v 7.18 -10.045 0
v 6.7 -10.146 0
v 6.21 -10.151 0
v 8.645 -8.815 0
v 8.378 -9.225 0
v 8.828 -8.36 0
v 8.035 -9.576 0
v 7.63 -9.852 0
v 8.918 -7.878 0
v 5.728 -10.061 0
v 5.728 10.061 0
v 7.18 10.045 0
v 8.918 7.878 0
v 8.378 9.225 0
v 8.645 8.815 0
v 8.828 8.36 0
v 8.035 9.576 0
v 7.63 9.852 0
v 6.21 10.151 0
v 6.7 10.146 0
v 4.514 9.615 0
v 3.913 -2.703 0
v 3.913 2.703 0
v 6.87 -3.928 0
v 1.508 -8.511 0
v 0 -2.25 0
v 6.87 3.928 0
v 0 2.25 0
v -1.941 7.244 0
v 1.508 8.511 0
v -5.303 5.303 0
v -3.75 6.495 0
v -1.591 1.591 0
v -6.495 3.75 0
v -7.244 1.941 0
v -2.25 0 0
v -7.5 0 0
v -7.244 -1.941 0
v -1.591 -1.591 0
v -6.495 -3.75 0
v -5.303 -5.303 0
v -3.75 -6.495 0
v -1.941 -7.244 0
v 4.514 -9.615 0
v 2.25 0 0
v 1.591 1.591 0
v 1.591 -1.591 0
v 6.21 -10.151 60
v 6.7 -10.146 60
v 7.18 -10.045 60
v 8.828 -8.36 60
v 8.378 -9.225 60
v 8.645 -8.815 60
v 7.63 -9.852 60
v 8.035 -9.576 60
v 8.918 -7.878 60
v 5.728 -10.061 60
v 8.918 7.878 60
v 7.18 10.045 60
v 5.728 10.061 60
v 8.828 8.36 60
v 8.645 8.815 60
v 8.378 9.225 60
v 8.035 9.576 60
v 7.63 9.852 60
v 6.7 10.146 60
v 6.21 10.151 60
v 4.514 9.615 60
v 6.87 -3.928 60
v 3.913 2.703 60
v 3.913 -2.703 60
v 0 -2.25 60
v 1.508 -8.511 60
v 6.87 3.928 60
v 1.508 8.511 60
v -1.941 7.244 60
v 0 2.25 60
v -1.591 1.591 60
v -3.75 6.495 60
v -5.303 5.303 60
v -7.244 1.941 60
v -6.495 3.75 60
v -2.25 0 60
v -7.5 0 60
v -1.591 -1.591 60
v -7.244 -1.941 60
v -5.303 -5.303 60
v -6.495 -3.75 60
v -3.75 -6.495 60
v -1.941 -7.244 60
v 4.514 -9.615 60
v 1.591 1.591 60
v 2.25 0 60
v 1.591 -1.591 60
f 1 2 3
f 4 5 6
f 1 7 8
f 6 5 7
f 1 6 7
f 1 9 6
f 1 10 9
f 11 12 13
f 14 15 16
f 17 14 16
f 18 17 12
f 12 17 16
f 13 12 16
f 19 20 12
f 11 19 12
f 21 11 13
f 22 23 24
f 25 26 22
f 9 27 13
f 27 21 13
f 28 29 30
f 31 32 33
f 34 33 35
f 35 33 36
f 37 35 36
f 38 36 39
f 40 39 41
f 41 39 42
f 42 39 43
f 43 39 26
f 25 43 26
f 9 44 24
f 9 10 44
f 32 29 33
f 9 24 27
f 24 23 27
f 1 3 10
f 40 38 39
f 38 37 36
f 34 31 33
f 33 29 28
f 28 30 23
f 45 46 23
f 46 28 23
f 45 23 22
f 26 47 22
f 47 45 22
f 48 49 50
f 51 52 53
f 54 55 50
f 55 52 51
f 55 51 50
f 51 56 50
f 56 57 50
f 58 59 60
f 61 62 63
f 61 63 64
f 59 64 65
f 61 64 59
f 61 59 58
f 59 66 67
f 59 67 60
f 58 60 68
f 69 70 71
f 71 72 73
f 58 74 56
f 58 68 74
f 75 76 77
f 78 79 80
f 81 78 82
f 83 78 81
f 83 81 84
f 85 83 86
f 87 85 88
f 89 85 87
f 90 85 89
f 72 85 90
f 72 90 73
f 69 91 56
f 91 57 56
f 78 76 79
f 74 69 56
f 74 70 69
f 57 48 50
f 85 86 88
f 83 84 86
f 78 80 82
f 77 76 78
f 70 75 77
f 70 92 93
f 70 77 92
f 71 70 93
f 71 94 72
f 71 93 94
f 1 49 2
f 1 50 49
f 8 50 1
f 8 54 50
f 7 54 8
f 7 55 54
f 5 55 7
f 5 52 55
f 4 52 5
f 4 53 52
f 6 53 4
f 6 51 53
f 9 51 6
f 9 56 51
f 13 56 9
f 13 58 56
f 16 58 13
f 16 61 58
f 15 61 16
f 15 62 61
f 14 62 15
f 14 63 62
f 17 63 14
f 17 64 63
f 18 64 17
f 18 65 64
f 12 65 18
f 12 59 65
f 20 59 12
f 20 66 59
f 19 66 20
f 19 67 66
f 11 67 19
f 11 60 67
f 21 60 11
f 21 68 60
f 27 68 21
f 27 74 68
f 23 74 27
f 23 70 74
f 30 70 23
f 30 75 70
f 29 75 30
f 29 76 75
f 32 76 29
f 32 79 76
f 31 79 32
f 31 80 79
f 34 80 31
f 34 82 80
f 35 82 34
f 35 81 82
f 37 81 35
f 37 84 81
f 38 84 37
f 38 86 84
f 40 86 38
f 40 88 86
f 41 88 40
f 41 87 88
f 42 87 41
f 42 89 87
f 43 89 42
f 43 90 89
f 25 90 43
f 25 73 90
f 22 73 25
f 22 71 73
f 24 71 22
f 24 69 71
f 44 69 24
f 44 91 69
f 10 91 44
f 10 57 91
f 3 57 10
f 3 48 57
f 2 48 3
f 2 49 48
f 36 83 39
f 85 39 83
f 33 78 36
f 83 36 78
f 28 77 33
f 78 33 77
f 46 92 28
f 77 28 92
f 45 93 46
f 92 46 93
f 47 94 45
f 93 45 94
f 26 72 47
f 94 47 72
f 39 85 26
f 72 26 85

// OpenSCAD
// file: dimensions.scad
internal_height = 60;

plate_width = 280;
plate_vertex_radius = 15;

pillar_offset = (plate_width / 2) - 12;
side_panel_offset = 124.5;

top_plate_thickness = 3;
bottom_plate_thickness = 5;
side_panel_thickness = 3;

side_panel_width = 94;
side_panel_tab_width = 15;
side_panel_tab_offset = 40;

card_reader_spacer_thickness = 1.5;
card_reader_offset = 70;
card_reader_mounting_holes = [[0, 0], [-7, 20], [7, 20]];

control_board_spacer_thickness = 3;
control_board_offset = (70 / 2) - 5;
control_board_mounting_holes = [[-38 / 2, 0], [38 / 2, 0]];

led_ring_mount_offset = 152 / 2;
// main file
include <dimensions.scad>;

module Pillar() {
    difference() {
        // Profile
        hull() {
            circle(d = 15);
            for(a = [-50, 50]) {
                rotate(a) {
                    translate([10, 0, 0]) {
                        circle(r = 2.5, $fn = 32);
                    }
                }
            }
        }

        // Mounting hole (for M3 brass insert)
        circle(d = 4.5, $fn = 8);

        // Side panel cutout
        for(a = [0, 180]) {
            rotate([a, 0, 0]) {
                rotate(45 / 2) {
                    translate([6.25, 5, 0]) {
                        square([side_panel_thickness + 0.2, 8], center = true);
                    }
                }
            }
        }
    }
}

module Pillar3D() {
    linear_extrude(internal_height) {
        Pillar();
    }
}

Pillar3D();
